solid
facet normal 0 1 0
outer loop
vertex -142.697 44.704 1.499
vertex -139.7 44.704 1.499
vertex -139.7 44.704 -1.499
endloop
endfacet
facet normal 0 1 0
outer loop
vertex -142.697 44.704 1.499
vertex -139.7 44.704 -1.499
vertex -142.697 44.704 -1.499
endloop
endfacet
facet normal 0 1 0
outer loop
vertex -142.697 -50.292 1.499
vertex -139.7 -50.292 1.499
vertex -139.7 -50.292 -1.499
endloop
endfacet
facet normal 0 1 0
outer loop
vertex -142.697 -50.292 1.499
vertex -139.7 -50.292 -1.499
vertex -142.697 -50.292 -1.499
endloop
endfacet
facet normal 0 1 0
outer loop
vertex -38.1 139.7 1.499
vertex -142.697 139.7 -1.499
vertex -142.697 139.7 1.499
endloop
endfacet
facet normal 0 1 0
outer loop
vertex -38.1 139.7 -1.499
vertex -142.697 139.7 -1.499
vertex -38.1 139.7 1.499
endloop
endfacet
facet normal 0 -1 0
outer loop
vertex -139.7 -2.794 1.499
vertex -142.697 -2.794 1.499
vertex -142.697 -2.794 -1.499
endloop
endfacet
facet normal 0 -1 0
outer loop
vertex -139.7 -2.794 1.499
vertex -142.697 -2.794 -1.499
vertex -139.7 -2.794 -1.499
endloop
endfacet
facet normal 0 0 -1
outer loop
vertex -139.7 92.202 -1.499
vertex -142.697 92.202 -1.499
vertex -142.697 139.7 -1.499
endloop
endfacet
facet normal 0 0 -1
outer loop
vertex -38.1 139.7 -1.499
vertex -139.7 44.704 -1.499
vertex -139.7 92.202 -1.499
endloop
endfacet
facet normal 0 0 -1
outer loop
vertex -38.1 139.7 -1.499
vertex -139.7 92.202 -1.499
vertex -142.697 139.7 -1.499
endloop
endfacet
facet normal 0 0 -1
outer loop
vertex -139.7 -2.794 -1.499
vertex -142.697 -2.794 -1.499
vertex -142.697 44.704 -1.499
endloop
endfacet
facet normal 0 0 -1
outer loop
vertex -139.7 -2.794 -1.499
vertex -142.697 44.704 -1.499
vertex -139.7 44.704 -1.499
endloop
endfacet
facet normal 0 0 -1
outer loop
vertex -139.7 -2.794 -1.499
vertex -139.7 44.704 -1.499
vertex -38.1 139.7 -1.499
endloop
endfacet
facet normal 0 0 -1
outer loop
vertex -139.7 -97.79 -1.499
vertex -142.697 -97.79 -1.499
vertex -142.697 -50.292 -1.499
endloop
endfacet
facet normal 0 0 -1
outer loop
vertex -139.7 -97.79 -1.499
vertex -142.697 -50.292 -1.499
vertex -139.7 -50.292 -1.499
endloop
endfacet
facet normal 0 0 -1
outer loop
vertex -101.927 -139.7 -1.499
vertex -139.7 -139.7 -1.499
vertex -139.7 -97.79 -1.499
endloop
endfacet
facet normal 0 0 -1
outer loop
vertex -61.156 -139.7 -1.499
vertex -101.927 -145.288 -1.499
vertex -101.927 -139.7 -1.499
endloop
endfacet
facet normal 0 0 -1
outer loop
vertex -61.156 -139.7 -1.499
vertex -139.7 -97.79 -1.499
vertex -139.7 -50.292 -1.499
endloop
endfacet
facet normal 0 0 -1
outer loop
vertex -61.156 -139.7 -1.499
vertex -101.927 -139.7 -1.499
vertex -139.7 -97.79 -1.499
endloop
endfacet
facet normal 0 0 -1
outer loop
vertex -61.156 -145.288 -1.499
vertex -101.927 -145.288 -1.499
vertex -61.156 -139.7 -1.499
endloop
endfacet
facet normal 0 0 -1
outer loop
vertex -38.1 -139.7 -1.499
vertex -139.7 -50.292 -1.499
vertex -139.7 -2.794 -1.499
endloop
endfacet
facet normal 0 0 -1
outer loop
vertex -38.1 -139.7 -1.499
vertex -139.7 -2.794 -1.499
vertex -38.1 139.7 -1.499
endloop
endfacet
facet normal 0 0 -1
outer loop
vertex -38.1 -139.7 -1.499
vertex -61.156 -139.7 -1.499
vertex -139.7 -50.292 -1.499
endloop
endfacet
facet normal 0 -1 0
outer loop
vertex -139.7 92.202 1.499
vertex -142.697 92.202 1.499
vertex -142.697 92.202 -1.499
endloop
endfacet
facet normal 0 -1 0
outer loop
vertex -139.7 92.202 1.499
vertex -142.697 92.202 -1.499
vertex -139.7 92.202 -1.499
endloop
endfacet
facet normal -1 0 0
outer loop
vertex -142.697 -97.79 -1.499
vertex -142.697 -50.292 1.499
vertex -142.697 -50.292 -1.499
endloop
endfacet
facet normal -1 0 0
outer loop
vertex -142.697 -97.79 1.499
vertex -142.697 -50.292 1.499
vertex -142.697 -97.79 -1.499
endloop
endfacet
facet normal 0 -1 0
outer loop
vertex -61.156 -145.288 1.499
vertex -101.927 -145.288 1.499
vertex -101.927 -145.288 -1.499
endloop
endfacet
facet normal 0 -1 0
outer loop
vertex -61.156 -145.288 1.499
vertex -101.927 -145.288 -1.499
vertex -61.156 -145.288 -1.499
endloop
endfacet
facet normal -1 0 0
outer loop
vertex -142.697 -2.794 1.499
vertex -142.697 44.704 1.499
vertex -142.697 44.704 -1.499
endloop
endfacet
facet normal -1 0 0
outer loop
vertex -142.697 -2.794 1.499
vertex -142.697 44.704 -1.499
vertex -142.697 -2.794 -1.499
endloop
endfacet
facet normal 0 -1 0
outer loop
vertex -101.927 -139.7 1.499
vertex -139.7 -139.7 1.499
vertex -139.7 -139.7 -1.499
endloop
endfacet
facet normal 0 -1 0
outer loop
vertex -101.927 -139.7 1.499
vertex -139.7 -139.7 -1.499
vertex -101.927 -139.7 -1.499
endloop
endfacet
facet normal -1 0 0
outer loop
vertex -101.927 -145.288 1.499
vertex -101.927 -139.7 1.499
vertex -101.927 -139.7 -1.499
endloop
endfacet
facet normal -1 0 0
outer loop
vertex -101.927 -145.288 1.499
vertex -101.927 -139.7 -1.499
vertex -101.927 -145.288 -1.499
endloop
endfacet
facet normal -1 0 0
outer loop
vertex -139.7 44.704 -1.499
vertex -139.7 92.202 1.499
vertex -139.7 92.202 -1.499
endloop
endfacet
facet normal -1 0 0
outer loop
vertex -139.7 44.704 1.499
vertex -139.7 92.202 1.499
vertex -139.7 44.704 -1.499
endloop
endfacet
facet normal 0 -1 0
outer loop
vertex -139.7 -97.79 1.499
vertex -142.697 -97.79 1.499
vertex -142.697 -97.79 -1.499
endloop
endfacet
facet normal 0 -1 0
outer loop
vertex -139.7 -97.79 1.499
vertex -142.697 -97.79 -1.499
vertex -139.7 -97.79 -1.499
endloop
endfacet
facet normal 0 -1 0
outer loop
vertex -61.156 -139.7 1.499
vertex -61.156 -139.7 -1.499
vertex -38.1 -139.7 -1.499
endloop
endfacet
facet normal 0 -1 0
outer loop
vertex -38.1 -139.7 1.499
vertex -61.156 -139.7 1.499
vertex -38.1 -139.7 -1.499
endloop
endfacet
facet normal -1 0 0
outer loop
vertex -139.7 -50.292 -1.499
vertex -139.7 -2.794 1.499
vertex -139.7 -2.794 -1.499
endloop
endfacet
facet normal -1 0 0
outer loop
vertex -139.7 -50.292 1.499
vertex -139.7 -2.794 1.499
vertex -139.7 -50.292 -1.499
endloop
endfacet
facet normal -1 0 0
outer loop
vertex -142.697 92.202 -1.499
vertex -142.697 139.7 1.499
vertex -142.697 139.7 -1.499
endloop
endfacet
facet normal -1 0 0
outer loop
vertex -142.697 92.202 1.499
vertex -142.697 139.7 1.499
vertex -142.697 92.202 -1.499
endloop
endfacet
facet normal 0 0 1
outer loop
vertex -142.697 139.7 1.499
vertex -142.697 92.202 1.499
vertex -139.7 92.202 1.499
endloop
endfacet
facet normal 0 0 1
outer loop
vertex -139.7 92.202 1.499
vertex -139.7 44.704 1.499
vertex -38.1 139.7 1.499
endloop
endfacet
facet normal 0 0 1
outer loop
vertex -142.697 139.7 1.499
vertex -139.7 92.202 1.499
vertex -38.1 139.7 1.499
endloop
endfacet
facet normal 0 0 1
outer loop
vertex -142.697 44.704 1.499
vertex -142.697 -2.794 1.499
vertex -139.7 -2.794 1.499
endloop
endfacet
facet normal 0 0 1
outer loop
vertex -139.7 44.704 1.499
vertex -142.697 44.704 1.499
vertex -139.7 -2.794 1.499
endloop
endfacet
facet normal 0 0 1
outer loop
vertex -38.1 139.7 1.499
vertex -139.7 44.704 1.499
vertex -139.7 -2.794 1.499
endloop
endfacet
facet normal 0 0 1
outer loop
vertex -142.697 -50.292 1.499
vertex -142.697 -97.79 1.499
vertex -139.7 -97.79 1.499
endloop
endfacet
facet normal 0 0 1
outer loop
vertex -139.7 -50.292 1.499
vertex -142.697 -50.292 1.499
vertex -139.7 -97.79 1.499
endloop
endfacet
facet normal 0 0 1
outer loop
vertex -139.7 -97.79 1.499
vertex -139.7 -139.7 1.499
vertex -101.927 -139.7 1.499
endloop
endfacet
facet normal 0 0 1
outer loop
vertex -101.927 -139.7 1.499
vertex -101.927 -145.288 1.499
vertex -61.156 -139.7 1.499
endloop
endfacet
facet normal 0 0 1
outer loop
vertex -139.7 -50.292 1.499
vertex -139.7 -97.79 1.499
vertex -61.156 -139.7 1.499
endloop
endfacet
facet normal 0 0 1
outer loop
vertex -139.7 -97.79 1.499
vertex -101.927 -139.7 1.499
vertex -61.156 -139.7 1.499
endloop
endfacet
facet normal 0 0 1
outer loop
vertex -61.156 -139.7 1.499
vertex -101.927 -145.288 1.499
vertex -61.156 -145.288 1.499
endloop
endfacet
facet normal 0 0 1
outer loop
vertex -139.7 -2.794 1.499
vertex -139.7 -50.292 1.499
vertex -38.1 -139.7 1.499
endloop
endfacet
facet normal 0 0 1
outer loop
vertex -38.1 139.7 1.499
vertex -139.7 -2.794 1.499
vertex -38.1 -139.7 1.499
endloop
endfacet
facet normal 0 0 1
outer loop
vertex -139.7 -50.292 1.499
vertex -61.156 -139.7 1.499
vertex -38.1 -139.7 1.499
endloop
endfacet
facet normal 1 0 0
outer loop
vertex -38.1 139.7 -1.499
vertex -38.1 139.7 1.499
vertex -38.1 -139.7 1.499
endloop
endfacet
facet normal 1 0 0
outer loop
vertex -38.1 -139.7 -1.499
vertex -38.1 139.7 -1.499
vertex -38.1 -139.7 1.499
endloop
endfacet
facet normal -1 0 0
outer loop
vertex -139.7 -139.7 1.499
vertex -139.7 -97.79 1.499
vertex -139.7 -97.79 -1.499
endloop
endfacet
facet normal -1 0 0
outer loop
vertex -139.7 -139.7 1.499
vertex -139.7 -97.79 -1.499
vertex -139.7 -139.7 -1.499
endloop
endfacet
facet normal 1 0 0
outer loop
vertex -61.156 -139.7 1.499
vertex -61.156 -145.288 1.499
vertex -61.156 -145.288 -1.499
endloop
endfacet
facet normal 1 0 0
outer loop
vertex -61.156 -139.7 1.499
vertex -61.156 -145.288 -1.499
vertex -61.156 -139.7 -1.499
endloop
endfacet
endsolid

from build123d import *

# Parameters (mm, degrees)
BOSS_EXTRUDE1_DEPTH = 1.4986
MIRROR1_START       = -139.7
MIRROR1_OUTLINE_W   = 101.6
MIRROR1_OUTLINE_H   = 2.9972
MIRROR1_DEPTH       = 279.4
MIRROR1_START_2     = -145.288
MIRROR1_2_OUTLINE_W = 40.770628572
MIRROR1_2_OUTLINE_H = 2.9972
MIRROR1_2_DEPTH     = 5.588
MIRROR1_START_3     = -97.79
MIRROR1_3_OUTLINE_W = 2.9972
MIRROR1_3_OUTLINE_H = 2.9972
MIRROR1_3_DEPTH     = 47.498
MIRROR1_START_4     = -2.794
MIRROR1_4_OUTLINE_W = 2.9972
MIRROR1_4_OUTLINE_H = 2.9972
MIRROR1_4_DEPTH     = 47.498
MIRROR1_START_5     = 92.202
MIRROR1_5_OUTLINE_W = 2.9972
MIRROR1_5_OUTLINE_H = 2.9972
MIRROR1_5_DEPTH     = 47.498
CUT_EXTRUDE2_DEPTH  = 204.666583022


# Read off the part's stored shape, not the designer's step: Mirror1
with BuildPart() as part:
    # Sketch1 → Boss-Extrude1 (new, symmetric)
    with BuildSketch(Plane.XY):
        Polygon((-38.1, 139.7), (-142.6972, 139.7), (-142.6972, 92.202), (-139.7, 92.202), (-139.7, 44.704), (-142.6972, 44.704), (-142.6972, -2.794), (-139.7, -2.794), (-139.7, -50.292), (-142.6972, -50.292), (-142.6972, -97.79), (-139.7, -97.79), (-139.7, -139.7), (-101.926571429, -139.7), (-101.926571429, -145.288), (-61.155942857, -145.288), (-61.155942857, -139.7), (-38.1, -139.7), align=None)
    extrude(amount=BOSS_EXTRUDE1_DEPTH, both=True)

    # Mirror1 outline → Mirror1 (add)
    with BuildSketch(Plane(origin=(0, 0, 0), x_dir=(1, 0, 0), z_dir=(0, 1, 0)).offset(MIRROR1_START)):
        with Locations((12.7, 0)):
            Rectangle(MIRROR1_OUTLINE_W, MIRROR1_OUTLINE_H)
    extrude(amount=MIRROR1_DEPTH)

    # Mirror1 2 outline → Mirror1 2 (add)
    with BuildSketch(Plane(origin=(0, 0, 0), x_dir=(1, 0, 0), z_dir=(0, 1, 0)).offset(MIRROR1_START_2)):
        with Locations((5.341257143, 0)):
            Rectangle(MIRROR1_2_OUTLINE_W, MIRROR1_2_OUTLINE_H)
    extrude(amount=MIRROR1_2_DEPTH)

    # Mirror1 3 outline → Mirror1 3 (add)
    with BuildSketch(Plane(origin=(0, 0, 0), x_dir=(1, 0, 0), z_dir=(0, 1, 0)).offset(MIRROR1_START_3)):
        with Locations((64.9986, 0)):
            Rectangle(MIRROR1_3_OUTLINE_W, MIRROR1_3_OUTLINE_H)
    extrude(amount=MIRROR1_3_DEPTH)

    # Mirror1 4 outline → Mirror1 4 (add)
    with BuildSketch(Plane(origin=(0, 0, 0), x_dir=(1, 0, 0), z_dir=(0, 1, 0)).offset(MIRROR1_START_4)):
        with Locations((64.9986, 0)):
            Rectangle(MIRROR1_4_OUTLINE_W, MIRROR1_4_OUTLINE_H)
    extrude(amount=MIRROR1_4_DEPTH)

    # Mirror1 5 outline → Mirror1 5 (add)
    with BuildSketch(Plane(origin=(0, 0, 0), x_dir=(1, 0, 0), z_dir=(0, 1, 0)).offset(MIRROR1_START_5)):
        with Locations((64.9986, 0)):
            Rectangle(MIRROR1_5_OUTLINE_W, MIRROR1_5_OUTLINE_H)
    extrude(amount=MIRROR1_5_DEPTH)

    # Sketch2<3> → Cut-Extrude2 (cut, through all)
    with BuildSketch(Plane.XY.offset(1.4986)):
        Polygon((66.4972, 139.7), (-38.1, 139.7), (-38.1, -139.7), (-15.044057143, -139.7), (-15.044057143, -145.288), (25.726571429, -145.288), (25.726571429, -139.7), (63.5, -139.7), (63.5, -97.79), (66.4972, -97.79), (66.4972, -50.292), (63.5, -50.292), (63.5, -2.794), (66.4972, -2.794), (66.4972, 44.704), (63.5, 44.704), (63.5, 92.202), (66.4972, 92.202), align=None)
    extrude(amount=-CUT_EXTRUDE2_DEPTH, mode=Mode.SUBTRACT)


solid = part.part
